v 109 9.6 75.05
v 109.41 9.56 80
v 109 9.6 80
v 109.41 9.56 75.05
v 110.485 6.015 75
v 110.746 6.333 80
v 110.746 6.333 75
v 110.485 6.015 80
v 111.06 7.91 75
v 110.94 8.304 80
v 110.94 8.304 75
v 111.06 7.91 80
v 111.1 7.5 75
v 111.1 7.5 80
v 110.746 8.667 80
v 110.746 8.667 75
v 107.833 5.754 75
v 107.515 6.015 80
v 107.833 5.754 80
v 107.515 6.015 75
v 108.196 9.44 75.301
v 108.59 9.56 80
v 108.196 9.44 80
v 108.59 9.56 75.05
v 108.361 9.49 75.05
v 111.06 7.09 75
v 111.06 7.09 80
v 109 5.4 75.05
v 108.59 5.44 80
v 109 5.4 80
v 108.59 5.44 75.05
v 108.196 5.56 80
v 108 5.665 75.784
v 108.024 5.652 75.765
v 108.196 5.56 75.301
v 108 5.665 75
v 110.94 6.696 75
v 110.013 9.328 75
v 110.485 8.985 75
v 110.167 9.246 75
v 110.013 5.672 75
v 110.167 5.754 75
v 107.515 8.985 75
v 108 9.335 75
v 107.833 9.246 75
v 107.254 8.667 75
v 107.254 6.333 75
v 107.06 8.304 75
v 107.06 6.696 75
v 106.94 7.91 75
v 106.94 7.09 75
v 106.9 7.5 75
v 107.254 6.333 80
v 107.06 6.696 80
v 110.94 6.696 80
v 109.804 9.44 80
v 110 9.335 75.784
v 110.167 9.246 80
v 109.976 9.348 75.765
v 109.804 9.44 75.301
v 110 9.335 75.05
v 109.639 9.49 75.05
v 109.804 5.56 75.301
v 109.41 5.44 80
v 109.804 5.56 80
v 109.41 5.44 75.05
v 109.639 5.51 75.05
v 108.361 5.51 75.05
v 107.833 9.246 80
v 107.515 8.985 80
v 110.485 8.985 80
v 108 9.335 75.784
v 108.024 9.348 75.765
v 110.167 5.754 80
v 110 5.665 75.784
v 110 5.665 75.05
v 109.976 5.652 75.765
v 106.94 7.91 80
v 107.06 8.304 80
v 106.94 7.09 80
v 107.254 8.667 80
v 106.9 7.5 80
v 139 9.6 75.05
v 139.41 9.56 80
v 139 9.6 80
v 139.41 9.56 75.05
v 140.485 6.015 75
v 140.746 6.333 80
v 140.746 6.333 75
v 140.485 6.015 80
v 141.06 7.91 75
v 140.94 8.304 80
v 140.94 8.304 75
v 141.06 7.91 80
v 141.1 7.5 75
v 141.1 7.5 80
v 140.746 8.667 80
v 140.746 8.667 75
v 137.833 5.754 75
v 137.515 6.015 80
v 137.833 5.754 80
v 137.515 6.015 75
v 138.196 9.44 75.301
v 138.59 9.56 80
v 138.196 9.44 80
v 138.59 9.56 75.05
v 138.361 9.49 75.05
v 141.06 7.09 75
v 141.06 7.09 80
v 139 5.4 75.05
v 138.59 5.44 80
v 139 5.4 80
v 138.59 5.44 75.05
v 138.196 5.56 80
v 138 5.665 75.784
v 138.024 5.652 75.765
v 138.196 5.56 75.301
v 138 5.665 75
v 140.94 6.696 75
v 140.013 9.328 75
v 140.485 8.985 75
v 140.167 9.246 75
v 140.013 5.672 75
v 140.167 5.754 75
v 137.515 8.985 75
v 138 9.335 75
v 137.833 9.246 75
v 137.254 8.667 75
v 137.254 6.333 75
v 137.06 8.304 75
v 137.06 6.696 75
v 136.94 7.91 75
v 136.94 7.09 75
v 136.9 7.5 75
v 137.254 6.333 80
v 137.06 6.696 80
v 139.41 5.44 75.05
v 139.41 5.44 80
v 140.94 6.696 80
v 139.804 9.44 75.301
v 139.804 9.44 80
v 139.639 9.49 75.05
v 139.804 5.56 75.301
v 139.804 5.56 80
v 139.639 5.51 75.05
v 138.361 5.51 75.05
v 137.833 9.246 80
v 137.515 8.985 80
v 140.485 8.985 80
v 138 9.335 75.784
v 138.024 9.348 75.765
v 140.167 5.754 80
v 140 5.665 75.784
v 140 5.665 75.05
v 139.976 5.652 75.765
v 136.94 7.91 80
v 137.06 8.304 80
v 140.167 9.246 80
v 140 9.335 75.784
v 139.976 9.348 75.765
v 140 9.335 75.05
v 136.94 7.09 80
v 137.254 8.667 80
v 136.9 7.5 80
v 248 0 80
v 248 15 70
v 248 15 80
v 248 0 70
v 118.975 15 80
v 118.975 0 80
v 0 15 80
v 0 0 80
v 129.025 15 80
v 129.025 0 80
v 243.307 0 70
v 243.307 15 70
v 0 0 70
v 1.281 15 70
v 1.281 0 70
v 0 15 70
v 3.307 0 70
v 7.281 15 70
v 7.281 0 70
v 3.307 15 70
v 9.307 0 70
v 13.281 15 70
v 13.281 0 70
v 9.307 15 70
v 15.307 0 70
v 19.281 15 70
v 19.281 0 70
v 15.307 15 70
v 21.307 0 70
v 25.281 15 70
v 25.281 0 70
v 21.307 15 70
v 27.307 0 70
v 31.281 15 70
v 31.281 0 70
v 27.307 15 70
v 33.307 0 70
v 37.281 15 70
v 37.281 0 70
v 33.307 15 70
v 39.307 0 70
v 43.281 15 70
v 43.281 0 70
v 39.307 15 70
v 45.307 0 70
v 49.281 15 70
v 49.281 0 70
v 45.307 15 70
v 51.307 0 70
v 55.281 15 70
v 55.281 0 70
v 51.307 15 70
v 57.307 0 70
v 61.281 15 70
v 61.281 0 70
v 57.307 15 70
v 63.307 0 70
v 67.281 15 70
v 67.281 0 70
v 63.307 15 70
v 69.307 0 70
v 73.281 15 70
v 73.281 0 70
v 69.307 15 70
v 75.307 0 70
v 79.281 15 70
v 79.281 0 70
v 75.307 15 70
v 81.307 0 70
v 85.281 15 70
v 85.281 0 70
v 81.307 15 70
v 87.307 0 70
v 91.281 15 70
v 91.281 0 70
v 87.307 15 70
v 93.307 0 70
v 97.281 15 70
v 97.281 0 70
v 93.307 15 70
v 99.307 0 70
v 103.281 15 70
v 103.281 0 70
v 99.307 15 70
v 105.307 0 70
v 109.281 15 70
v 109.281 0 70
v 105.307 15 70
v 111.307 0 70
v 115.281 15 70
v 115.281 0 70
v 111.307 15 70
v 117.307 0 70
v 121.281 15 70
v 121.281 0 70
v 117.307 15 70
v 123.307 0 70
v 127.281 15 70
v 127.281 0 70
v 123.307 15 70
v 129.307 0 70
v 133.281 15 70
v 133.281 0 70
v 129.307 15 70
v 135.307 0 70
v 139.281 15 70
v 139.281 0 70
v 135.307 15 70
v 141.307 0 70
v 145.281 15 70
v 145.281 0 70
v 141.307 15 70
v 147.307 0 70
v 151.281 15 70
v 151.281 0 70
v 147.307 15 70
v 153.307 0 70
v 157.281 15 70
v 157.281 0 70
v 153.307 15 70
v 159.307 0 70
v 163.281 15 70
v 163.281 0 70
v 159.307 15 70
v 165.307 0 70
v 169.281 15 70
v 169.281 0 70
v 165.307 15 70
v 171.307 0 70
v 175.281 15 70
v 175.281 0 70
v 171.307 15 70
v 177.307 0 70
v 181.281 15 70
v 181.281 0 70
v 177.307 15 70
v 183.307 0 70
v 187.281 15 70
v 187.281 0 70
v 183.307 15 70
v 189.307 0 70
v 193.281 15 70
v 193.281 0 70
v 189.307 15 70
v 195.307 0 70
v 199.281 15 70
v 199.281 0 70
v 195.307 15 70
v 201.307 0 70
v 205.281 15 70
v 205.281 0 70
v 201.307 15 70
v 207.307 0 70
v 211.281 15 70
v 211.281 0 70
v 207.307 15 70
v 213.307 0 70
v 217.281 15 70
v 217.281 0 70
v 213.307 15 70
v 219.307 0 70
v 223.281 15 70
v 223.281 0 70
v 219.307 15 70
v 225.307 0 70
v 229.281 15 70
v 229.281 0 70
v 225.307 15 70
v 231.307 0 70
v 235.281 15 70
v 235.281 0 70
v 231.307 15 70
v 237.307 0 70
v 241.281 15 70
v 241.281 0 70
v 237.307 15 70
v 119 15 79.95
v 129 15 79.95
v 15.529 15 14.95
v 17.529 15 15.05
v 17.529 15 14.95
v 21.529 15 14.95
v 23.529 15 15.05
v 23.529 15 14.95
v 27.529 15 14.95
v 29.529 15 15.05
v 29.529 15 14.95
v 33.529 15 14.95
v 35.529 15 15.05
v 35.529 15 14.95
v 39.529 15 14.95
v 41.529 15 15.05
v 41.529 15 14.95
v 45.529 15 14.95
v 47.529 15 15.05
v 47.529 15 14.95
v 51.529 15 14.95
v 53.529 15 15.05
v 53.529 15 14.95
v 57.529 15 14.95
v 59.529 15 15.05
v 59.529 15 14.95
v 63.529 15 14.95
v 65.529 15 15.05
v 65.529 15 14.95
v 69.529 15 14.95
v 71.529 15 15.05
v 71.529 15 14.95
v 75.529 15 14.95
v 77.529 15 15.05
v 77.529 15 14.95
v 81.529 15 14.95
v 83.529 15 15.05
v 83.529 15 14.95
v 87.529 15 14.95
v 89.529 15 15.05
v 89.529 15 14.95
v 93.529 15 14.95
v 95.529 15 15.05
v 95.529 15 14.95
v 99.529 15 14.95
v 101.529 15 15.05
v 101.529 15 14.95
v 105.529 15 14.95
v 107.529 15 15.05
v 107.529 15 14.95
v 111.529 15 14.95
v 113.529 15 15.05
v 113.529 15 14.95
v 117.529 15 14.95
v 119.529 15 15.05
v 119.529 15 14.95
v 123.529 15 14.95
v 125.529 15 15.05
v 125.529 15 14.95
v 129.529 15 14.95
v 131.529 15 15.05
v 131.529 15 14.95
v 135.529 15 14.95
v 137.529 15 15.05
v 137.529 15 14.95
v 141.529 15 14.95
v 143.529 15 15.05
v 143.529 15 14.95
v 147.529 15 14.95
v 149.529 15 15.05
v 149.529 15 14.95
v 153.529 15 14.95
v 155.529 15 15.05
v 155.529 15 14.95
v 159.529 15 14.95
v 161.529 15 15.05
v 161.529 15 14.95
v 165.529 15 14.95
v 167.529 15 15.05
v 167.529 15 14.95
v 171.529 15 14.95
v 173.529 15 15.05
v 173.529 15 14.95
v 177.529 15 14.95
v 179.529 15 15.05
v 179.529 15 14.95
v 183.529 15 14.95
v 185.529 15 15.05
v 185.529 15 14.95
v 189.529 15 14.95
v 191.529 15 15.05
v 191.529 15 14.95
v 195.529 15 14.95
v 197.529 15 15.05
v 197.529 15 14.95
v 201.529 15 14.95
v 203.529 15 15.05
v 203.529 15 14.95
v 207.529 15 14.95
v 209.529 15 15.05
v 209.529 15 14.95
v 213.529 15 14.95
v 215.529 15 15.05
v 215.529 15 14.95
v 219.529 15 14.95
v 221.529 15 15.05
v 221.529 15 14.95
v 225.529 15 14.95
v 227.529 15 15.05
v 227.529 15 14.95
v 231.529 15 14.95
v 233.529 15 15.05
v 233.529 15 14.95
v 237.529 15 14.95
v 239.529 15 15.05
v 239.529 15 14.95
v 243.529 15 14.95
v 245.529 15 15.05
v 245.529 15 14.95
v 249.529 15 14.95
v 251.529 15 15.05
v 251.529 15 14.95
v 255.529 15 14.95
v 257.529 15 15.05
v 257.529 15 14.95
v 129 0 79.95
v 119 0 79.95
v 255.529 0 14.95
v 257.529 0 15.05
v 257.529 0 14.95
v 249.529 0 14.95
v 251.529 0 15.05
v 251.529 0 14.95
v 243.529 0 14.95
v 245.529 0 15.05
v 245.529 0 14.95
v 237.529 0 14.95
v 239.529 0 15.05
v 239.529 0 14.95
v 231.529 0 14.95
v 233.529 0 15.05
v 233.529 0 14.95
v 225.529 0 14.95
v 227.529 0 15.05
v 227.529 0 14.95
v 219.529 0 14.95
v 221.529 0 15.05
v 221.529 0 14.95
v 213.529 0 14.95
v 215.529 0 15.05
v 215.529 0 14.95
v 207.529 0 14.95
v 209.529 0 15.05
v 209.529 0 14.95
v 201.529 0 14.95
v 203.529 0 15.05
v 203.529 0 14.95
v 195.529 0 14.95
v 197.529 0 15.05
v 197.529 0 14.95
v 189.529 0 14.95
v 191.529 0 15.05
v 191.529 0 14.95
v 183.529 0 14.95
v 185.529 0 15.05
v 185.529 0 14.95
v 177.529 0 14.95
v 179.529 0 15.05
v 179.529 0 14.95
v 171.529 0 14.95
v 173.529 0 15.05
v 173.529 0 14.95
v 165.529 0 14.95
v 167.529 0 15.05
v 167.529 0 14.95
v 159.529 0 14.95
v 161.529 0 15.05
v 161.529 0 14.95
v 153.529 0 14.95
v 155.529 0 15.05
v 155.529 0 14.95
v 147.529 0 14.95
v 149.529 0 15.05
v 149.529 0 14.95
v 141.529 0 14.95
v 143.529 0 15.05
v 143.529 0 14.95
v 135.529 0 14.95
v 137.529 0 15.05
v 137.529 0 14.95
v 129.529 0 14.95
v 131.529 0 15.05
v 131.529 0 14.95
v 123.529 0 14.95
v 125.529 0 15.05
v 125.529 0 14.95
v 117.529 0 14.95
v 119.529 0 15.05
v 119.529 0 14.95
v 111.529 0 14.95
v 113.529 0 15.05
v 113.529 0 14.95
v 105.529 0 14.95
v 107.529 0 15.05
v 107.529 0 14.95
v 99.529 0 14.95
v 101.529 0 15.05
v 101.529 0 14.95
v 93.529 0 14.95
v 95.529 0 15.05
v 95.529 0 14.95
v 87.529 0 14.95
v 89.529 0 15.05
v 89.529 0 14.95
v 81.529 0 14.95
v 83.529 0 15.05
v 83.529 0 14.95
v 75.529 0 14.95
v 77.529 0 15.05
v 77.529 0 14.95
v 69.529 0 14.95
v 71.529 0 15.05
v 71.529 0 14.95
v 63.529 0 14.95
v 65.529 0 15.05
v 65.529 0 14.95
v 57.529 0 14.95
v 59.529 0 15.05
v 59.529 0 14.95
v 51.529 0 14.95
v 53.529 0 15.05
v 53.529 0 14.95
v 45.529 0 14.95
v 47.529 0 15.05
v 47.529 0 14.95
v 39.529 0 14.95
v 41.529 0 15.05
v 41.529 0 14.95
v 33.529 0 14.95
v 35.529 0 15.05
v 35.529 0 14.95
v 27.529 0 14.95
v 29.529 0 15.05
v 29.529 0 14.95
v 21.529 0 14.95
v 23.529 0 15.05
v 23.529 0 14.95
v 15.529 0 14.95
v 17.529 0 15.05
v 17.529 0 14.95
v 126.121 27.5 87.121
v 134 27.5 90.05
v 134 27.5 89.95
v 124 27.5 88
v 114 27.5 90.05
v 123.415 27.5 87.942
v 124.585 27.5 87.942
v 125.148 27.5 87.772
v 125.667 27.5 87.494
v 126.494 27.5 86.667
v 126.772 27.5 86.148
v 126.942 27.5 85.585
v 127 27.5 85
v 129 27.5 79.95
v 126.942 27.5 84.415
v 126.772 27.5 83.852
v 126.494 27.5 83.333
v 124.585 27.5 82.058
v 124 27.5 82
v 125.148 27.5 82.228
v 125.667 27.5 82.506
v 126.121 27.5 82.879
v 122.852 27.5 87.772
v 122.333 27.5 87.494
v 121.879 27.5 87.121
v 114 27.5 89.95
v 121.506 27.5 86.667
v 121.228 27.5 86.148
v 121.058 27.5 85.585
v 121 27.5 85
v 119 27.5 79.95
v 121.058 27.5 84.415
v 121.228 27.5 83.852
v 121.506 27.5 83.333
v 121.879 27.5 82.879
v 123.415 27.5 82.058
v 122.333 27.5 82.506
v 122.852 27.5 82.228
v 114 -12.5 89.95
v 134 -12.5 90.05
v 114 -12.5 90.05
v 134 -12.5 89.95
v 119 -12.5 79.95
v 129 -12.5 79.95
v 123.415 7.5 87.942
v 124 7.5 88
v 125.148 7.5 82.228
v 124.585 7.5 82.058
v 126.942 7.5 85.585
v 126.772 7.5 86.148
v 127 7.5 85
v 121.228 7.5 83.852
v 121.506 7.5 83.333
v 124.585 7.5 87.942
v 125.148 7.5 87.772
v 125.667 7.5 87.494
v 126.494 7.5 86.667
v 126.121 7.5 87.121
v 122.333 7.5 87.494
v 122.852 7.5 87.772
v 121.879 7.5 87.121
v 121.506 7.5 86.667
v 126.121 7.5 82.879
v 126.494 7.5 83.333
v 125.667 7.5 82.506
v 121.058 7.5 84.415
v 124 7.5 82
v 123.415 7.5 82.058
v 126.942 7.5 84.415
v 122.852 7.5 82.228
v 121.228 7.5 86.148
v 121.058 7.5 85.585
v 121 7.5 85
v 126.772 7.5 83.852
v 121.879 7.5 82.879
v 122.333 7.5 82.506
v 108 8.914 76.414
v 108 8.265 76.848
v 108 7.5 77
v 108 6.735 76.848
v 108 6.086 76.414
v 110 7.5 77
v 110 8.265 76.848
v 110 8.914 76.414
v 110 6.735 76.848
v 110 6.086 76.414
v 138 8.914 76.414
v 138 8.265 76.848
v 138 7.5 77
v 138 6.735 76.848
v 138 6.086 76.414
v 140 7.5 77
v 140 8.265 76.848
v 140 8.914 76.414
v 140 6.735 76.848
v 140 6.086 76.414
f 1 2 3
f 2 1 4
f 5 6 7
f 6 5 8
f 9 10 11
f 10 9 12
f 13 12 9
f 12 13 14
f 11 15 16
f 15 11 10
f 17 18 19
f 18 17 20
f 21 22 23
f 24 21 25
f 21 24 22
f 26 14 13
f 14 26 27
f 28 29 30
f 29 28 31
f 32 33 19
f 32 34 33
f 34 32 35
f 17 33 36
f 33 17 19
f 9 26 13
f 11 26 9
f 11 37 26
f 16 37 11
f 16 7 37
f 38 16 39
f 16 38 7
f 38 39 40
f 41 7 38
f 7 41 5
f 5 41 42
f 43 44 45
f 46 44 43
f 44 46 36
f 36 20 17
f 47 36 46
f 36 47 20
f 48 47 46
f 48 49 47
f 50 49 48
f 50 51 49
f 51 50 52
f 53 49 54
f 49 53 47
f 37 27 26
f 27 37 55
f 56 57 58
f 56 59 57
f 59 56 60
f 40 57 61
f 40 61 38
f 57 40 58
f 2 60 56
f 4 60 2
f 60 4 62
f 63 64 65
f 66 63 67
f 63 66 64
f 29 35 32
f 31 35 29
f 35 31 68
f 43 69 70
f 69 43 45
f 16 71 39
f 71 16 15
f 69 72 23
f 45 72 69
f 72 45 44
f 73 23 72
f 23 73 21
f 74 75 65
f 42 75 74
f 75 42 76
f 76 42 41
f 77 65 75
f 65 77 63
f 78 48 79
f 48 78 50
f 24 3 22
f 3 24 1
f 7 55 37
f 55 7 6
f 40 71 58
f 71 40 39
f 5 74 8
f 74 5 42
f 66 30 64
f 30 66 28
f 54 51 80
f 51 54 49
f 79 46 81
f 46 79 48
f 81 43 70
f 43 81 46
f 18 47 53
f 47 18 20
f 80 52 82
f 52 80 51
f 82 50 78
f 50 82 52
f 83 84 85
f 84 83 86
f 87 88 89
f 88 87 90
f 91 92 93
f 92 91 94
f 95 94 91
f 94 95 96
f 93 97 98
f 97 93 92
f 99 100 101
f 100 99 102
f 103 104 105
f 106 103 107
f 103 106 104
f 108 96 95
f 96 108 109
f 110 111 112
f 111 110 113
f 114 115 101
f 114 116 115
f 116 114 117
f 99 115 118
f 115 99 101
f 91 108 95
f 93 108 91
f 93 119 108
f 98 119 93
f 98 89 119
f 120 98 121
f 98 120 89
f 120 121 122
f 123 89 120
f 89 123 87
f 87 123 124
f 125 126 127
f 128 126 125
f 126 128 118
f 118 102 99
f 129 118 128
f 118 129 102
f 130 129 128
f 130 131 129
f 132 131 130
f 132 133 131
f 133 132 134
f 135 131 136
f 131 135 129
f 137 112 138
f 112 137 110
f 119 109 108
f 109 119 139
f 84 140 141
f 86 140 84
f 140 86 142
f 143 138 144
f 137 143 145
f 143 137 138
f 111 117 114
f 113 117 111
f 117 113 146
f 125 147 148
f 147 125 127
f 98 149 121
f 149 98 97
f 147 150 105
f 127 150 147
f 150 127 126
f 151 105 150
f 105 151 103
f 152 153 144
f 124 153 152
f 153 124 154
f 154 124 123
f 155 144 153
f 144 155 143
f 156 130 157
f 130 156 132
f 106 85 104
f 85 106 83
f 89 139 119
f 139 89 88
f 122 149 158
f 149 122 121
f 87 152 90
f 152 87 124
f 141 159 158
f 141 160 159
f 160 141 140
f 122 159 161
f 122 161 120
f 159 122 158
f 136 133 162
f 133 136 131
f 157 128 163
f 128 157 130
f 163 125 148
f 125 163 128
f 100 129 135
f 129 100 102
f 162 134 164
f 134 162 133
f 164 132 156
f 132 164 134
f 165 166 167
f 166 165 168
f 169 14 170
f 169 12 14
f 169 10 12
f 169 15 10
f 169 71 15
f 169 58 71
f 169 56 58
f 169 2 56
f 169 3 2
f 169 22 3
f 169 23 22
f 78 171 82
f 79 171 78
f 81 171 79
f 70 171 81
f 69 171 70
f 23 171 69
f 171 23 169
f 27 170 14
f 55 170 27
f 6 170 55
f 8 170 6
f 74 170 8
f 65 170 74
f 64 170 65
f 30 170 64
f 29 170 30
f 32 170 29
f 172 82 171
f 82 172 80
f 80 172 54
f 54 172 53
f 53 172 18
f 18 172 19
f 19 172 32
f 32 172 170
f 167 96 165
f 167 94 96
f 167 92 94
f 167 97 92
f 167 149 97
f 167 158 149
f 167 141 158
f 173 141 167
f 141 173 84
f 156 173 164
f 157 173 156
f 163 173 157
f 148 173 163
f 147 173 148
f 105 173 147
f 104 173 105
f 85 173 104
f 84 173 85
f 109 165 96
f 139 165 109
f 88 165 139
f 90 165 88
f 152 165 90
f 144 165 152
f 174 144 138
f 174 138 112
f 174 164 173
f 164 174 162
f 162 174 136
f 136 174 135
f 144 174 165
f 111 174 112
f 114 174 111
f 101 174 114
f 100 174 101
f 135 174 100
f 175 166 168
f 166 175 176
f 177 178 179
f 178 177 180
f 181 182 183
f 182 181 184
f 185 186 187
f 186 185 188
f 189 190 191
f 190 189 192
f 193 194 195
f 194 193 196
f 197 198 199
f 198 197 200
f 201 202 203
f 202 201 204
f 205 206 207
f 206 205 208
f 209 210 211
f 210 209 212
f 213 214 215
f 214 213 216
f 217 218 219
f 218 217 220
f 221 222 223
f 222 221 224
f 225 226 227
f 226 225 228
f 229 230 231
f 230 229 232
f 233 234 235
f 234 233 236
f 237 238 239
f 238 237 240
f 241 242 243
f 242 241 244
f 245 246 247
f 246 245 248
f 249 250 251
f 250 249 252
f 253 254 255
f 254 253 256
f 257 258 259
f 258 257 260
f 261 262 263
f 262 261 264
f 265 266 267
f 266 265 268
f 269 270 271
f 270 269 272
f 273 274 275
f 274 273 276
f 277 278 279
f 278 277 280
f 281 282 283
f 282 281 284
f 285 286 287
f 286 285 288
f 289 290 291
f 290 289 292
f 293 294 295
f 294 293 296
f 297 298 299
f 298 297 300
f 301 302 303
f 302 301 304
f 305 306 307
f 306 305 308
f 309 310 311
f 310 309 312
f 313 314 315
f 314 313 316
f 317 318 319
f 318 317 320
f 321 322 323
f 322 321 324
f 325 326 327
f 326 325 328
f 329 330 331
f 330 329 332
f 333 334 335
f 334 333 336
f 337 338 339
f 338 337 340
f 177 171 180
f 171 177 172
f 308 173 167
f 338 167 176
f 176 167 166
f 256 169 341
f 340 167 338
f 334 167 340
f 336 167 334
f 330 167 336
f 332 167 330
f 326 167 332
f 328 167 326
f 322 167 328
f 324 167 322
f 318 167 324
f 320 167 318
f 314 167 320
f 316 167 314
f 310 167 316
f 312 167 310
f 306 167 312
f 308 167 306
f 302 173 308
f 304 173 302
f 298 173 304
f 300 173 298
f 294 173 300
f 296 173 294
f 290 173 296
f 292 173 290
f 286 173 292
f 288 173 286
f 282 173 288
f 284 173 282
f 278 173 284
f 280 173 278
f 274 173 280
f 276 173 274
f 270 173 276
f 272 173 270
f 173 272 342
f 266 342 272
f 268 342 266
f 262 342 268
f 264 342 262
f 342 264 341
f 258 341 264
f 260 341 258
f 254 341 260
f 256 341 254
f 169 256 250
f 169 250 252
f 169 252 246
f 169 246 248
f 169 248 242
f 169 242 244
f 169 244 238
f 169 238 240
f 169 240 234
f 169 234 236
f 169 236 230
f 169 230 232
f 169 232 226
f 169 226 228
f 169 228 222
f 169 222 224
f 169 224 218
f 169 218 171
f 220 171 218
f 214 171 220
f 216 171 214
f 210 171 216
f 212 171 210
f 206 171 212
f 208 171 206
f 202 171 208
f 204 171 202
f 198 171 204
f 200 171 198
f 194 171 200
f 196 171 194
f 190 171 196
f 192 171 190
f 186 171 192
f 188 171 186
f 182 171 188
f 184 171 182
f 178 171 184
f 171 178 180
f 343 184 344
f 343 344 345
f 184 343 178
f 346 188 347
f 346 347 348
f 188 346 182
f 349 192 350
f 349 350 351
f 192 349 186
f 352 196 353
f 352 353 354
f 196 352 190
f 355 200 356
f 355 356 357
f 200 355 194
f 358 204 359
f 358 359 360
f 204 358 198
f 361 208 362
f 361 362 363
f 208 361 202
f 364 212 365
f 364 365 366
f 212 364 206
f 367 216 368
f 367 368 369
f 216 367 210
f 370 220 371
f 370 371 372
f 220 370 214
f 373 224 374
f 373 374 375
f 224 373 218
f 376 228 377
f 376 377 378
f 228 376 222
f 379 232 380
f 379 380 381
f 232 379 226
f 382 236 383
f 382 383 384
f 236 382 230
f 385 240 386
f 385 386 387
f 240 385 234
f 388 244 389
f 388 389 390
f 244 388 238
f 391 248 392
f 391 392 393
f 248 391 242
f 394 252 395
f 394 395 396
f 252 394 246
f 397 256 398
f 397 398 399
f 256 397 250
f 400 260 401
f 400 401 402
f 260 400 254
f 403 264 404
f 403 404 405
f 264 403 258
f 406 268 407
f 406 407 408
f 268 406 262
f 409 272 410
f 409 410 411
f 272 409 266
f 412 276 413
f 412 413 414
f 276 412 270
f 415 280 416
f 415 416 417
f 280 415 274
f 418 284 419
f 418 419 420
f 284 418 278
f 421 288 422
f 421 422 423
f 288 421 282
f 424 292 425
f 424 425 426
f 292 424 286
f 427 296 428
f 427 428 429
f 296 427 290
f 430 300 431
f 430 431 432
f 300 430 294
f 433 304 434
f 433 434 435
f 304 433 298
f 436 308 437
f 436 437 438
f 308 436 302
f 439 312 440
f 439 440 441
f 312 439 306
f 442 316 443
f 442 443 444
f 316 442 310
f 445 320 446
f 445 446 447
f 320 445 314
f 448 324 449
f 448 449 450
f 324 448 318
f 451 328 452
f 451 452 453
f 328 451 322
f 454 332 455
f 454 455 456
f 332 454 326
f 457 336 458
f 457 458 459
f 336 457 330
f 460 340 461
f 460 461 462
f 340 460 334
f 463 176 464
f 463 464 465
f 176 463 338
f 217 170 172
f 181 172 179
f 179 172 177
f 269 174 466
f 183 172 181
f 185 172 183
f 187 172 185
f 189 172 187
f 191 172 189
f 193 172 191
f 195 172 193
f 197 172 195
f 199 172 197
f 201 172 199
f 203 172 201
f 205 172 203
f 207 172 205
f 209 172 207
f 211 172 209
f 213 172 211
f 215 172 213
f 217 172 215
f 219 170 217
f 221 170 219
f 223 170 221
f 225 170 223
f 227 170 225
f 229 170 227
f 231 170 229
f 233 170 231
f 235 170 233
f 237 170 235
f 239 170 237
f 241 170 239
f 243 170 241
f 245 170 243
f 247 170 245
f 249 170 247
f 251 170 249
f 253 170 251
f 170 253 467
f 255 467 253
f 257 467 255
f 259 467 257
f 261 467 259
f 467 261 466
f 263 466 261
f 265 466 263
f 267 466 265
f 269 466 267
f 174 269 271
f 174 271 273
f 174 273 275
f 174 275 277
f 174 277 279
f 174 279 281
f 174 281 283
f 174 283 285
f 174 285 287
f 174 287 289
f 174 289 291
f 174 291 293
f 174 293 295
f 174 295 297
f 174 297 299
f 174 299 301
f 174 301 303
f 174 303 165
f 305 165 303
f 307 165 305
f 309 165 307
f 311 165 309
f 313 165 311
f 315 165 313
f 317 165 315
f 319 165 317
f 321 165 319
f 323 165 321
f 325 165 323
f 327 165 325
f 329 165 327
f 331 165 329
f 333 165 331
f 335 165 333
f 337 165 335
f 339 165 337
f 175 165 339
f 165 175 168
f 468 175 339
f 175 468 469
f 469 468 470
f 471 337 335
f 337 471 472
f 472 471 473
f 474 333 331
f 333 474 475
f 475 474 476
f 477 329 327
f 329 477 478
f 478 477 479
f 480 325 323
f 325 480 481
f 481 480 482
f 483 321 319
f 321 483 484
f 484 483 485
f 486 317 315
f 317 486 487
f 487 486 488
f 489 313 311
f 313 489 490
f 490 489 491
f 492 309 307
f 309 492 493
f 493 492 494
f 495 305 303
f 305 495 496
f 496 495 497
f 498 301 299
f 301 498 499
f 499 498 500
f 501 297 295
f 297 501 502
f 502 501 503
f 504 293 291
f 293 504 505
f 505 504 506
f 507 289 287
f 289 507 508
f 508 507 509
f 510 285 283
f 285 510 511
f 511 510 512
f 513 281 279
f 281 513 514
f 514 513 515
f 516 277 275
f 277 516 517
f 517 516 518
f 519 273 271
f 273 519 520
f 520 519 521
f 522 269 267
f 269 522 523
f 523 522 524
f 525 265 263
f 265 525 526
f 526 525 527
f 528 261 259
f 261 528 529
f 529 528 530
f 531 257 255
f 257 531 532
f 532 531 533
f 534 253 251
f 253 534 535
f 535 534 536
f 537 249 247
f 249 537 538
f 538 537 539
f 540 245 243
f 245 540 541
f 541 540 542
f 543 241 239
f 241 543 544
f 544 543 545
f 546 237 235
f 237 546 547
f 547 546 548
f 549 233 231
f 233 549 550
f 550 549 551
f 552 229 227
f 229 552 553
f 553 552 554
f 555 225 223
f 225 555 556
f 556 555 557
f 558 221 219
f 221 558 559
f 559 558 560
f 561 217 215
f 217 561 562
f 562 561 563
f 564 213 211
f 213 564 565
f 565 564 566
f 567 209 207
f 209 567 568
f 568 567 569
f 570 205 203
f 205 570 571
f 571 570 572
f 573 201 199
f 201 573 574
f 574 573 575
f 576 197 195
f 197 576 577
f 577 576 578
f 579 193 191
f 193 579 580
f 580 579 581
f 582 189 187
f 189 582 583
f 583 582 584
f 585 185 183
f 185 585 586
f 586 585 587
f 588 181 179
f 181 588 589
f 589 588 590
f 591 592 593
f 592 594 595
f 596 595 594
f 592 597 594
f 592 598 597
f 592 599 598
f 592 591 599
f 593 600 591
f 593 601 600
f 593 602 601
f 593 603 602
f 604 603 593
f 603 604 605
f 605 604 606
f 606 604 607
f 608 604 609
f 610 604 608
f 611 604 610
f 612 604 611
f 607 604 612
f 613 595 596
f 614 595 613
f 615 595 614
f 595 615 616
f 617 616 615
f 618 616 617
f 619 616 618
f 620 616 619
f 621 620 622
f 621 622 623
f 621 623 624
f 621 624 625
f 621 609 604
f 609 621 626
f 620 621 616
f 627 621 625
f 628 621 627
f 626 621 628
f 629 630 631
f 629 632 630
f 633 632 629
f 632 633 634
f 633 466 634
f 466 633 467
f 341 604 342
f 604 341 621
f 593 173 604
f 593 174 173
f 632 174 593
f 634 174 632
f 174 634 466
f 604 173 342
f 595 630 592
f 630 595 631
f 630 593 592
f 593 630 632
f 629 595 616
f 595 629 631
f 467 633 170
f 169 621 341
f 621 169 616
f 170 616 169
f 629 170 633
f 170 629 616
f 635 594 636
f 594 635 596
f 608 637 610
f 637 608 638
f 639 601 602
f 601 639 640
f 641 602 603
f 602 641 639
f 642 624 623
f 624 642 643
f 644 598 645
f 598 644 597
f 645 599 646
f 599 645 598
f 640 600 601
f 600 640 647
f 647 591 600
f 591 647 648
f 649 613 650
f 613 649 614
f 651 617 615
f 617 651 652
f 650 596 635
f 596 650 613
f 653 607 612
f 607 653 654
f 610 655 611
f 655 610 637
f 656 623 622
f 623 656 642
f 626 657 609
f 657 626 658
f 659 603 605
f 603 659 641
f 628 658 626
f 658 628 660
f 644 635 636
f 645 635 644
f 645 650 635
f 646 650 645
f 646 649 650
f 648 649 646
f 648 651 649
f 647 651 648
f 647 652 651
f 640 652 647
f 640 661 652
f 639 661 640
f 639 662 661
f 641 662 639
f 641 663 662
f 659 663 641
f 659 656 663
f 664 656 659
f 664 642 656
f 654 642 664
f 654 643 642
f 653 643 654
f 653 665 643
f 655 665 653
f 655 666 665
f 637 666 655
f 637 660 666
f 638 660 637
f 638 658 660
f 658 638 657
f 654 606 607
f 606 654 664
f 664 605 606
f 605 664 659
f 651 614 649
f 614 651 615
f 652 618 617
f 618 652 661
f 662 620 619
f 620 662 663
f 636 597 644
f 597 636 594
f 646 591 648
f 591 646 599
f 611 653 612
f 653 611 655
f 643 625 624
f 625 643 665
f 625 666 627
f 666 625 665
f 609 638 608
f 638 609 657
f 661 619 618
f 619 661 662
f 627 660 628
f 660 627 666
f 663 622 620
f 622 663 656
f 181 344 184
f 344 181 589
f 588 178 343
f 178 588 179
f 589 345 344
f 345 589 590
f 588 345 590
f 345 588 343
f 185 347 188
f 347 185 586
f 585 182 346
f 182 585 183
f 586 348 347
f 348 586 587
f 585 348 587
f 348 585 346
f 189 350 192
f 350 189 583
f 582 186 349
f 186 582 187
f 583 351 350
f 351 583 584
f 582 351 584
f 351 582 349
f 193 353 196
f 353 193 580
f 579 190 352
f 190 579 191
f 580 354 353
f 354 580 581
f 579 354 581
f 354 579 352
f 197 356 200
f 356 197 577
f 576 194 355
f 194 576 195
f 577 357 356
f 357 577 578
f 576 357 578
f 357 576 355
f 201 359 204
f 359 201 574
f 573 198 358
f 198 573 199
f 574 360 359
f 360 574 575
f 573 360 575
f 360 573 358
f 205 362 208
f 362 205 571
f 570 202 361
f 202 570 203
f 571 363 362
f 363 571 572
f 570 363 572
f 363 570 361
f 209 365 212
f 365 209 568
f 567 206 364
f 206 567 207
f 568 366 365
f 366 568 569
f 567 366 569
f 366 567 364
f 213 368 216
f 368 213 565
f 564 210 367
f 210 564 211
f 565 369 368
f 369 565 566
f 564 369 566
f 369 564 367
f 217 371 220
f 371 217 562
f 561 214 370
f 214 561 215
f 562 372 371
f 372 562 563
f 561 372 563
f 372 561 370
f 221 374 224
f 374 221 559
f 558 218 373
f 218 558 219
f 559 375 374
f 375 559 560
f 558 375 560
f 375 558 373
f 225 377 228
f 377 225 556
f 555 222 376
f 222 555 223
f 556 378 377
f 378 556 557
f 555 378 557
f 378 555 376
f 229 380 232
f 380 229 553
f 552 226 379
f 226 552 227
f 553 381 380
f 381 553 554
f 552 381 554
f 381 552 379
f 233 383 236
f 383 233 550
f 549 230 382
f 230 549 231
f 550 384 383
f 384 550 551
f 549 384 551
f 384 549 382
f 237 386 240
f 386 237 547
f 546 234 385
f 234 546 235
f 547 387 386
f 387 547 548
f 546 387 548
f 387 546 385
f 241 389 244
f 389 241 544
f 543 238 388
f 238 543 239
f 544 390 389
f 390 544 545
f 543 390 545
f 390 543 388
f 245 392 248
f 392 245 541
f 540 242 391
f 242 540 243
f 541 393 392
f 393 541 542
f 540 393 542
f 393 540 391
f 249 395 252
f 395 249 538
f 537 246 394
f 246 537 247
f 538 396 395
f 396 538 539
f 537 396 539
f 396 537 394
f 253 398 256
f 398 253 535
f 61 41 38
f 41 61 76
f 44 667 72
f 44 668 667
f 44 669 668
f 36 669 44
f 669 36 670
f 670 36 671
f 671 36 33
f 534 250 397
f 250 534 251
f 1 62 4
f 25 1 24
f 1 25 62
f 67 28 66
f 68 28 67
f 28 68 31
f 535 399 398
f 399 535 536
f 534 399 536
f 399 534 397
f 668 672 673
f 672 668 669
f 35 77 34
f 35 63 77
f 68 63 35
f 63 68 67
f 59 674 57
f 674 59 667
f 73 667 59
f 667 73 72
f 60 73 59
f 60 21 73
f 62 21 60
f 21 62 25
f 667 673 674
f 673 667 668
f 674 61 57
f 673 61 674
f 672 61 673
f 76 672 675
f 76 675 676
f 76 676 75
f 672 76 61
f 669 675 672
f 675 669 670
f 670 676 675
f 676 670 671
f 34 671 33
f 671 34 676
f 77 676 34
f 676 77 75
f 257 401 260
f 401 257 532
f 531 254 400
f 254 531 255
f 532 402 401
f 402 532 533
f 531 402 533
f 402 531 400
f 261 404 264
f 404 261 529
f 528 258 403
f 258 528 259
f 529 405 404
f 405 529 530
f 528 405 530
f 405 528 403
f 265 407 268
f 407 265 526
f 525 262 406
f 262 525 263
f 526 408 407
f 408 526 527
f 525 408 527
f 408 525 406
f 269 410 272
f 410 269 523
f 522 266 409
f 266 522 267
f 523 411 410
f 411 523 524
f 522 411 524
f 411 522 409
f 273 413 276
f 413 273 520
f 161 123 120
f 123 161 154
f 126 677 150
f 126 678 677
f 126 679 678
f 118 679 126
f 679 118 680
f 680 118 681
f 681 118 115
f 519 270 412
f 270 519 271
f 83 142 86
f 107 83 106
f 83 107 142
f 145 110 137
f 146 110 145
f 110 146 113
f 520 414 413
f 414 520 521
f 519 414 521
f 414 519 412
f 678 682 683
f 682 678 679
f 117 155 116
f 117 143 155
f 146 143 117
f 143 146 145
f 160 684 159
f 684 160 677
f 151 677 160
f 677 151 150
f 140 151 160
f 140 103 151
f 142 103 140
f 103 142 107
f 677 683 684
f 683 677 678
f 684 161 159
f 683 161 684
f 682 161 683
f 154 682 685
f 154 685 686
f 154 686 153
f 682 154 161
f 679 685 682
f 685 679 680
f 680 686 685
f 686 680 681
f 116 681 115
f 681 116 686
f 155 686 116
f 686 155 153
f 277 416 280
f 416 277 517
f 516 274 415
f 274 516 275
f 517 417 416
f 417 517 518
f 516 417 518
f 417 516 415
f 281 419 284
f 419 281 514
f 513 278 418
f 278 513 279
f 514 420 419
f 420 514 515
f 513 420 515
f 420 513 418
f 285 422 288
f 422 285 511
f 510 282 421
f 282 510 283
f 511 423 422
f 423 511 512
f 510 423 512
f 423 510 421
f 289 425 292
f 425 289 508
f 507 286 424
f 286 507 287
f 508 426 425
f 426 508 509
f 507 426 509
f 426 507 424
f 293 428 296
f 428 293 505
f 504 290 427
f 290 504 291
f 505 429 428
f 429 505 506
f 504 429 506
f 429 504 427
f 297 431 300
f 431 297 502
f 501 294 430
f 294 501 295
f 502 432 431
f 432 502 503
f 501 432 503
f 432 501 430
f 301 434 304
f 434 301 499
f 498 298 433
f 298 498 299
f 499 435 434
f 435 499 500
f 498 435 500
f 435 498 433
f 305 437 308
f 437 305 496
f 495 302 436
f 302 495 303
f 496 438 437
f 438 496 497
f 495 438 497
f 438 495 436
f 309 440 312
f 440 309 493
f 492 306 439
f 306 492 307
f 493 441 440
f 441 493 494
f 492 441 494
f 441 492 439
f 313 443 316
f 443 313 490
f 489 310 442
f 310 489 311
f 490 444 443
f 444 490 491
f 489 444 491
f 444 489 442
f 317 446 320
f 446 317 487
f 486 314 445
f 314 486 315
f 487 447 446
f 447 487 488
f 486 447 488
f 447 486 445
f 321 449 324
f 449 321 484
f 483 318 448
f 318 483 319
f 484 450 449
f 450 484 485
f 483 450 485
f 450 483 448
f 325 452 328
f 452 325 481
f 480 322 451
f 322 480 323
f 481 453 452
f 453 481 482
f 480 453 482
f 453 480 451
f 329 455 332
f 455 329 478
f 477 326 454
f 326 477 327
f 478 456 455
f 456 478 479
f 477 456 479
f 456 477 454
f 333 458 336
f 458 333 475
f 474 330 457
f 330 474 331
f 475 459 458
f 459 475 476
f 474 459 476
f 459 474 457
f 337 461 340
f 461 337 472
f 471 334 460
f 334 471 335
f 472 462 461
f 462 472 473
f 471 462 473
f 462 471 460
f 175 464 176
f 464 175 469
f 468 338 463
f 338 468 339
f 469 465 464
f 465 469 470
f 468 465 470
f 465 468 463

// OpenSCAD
// =============================================================================
// PARAMETRIC SIFTING RAKE CARTRIDGE - TYPE A (CLUMPING CLAY)
// Auto-Emptying Cat Litter Box Project
// =============================================================================
//
// This OpenSCAD file generates a modular rake cartridge designed for
// clumping clay litter. The fine-toothed design allows clean litter to
// pass through while retaining clumps ≥10mm.
//
// Design Features:
// - Standardized dovetail mounting key for quick-change system
// - Parametric tooth spacing and thickness
// - Optimized for 256×256×256mm build volume
// - PETG recommended (impact resistance, odor resistance)
//
// Print Settings:
// - Layer Height: 0.2mm
// - Infill: 30% (grid pattern for directional rigidity)
// - Perimeters: 4 walls
// - Support: None required (optimized geometry)
//
// =============================================================================

// -----------------------
// USER-ADJUSTABLE PARAMETERS
// -----------------------

// Rake Dimensions
rake_width = 250;              // [mm] Total rake width (fits within 256mm build volume)
rake_height = 80;              // [mm] Vertical height of rake assembly
rake_depth = 15;               // [mm] Depth/thickness of rake body

// Tooth Parameters
tooth_thickness = 2;           // [mm] Thickness of each tooth
tooth_spacing = 4;             // [mm] Gap between teeth (determines sifting fineness)
tooth_height = 60;             // [mm] Length of teeth extending downward
tooth_angle = 15;              // [degrees] Forward angle of teeth (reduces resistance)

// Dovetail Mounting Key (STANDARDIZED - DO NOT MODIFY unless changing entire system)
dovetail_length = 40;          // [mm] Length of dovetail key
dovetail_base_width = 20;      // [mm] Base width of dovetail
dovetail_top_width = 10;       // [mm] Top width of dovetail (creates taper)
dovetail_height = 10;          // [mm] Height of dovetail key

// Pin Lock Hole (for spring-loaded locking pin)
pin_hole_diameter = 6;         // [mm] Diameter of pin lock hole
pin_hole_offset = 10;          // [mm] Distance from edge of dovetail

// Mounting Holes for Rake Body (M3 threaded inserts)
mounting_hole_diameter = 4.2;  // [mm] M3 threaded insert outer diameter
mounting_hole_depth = 5;       // [mm] Depth for threaded insert

// Structural Parameters
body_wall_thickness = 3;       // [mm] Wall thickness for main body
fillet_radius = 2;             // [mm] Fillets for stress distribution

// -----------------------
// CALCULATED VALUES
// -----------------------

// Calculate number of teeth that fit within rake width
tooth_pitch = tooth_thickness + tooth_spacing;
num_teeth = floor((rake_width - tooth_thickness) / tooth_pitch);
actual_rake_width = num_teeth * tooth_pitch + tooth_thickness;

echo(str("Rake Configuration:"));
echo(str("  Total Width: ", actual_rake_width, " mm"));
echo(str("  Number of Teeth: ", num_teeth));
echo(str("  Tooth Pitch: ", tooth_pitch, " mm"));

// -----------------------
// MAIN ASSEMBLY
// -----------------------

module rake_cartridge_type_a() {
    union() {
        // Main rake body
        rake_body();

        // Dovetail mounting key
        translate([actual_rake_width/2, rake_depth/2, rake_height])
            dovetail_key();

        // Teeth array
        translate([tooth_thickness/2, 0, rake_height - tooth_height - 5])
            teeth_array();
    }
}

// -----------------------
// COMPONENT MODULES
// -----------------------

// Main body structure
module rake_body() {
    difference() {
        // Solid body
        translate([0, 0, rake_height - 10])
            cube([actual_rake_width, rake_depth, 10]);

        // Mounting holes for M3 threaded inserts (4× holes on standardized grid)
        mounting_holes();
    }
}

// Dovetail key for carriage mounting
module dovetail_key() {
    difference() {
        // Tapered dovetail shape
        hull() {
            translate([0, 0, 0])
                cube([dovetail_top_width, dovetail_length, 0.1], center=true);
            translate([0, 0, dovetail_height])
                cube([dovetail_base_width, dovetail_length, 0.1], center=true);
        }

        // Pin lock hole (through-hole for spring-loaded pin)
        translate([0, dovetail_length/2 - pin_hole_offset, dovetail_height/2])
            rotate([90, 0, 0])
                cylinder(h=20, d=pin_hole_diameter, center=true, $fn=32);
    }
}

// Array of rake teeth
module teeth_array() {
    for (i = [0 : num_teeth - 1]) {
        translate([i * tooth_pitch, 0, 0])
            rake_tooth();
    }
}

// Individual rake tooth
module rake_tooth() {
    // Angled tooth for forward raking motion
    hull() {
        // Top of tooth (attached to body)
        translate([0, rake_depth/2, tooth_height])
            cube([tooth_thickness, rake_depth, 0.1], center=true);

        // Bottom of tooth (angled forward)
        translate([tooth_height * sin(tooth_angle), rake_depth/2, 0])
            cube([tooth_thickness, rake_depth, 0.1], center=true);
    }

    // Reinforcement fillet at base of tooth
    translate([0, rake_depth/2, tooth_height])
        rotate([0, 90, 0])
            cylinder(h=tooth_thickness, r=fillet_radius, center=true, $fn=16);
}

// Mounting holes for threaded inserts (standardized 30×30mm grid)
module mounting_holes() {
    hole_positions = [
        [actual_rake_width/2 - 15, rake_depth/2],
        [actual_rake_width/2 + 15, rake_depth/2]
    ];

    for (pos = hole_positions) {
        translate([pos[0], pos[1], rake_height - mounting_hole_depth])
            cylinder(h=mounting_hole_depth + 1, d=mounting_hole_diameter, $fn=32);
    }
}

// -----------------------
// RENDER MAIN ASSEMBLY
// -----------------------

rake_cartridge_type_a();

// =============================================================================
// ALTERNATIVE CONFIGURATIONS
// =============================================================================
//
// TYPE B - WIDE-SCOOP PELLET RAKE:
// Modify these parameters:
//   tooth_thickness = 4;        // Wider bars for structural rigidity
//   tooth_spacing = 8;          // Larger gaps to pass 6-7mm pellets
//   tooth_height = 50;          // Shorter teeth (less depth needed)
//
// TYPE C - HYBRID SILICA/TOFU RAKE:
// Replace teeth_array() with mesh pattern:
//   - Use rectangular slots: 3mm × 8mm
//   - Cross-bracing every 50mm
//   - See separate type_c variant file
//
// =============================================================================

// =============================================================================
// ASSEMBLY INSTRUCTIONS
// =============================================================================
//
// 1. PRINTING:
//    - Export STL: F6 (Render) → File → Export → STL
//    - Slice with 0.2mm layer height, 30% infill
//    - Print in PETG (recommended) or PLA
//    - No support required
//    - Estimated print time: 6 hours
//    - Estimated filament: 90g
//
// 2. POST-PROCESSING:
//    - Insert M3 threaded inserts into mounting holes (use soldering iron at 200°C)
//    - Verify dovetail key fits smoothly (light sanding if needed)
//    - Clean any stringing between teeth with wire cutters
//
// 3. INSTALLATION:
//    - Align dovetail key with carriage block dovetail slot
//    - Slide cartridge into carriage until pin hole aligns
//    - Release spring-loaded pin (should click into place)
//    - Verify cartridge is locked (pull test with ~5kg force)
//
// 4. TESTING:
//    - Manually test rake teeth in litter sample
//    - Verify teeth angle allows smooth sifting
//    - Check for any binding or flex under load
//
// =============================================================================

// =============================================================================
// MAINTENANCE & TROUBLESHOOTING
// =============================================================================
//
// COMMON ISSUES:
//
// 1. Teeth breaking during cleaning:
//    - Increase tooth_thickness to 2.5mm or 3mm
//    - Reduce tooth_height to 50mm (less leverage)
//    - Print with 4 perimeters for maximum strength
//
// 2. Litter passing through too easily:
//    - Reduce tooth_spacing to 3mm or 3.5mm
//    - Verify clumps are properly formed (check litter moisture)
//
// 3. Clumps getting stuck between teeth:
//    - Increase tooth_angle to 20° (more aggressive)
//    - Reduce tooth_spacing slightly
//    - Consider switching to Type B rake for pellet litter
//
// 4. Dovetail key not locking:
//    - Verify pin_hole_offset matches carriage block
//    - Check for layer adhesion issues (reprint in PETG)
//    - Lightly sand dovetail surfaces for smoother fit
//
// =============================================================================
